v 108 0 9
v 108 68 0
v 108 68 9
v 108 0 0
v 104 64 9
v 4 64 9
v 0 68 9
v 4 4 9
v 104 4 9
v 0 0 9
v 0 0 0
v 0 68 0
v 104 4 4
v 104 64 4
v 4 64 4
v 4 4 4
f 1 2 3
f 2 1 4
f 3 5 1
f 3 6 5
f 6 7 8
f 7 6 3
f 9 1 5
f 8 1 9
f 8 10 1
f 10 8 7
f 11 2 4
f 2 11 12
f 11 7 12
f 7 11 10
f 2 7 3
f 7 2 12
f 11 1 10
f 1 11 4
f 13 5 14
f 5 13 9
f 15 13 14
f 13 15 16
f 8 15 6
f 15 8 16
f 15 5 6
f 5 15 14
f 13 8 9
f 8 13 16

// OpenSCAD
// Size of one pentomino unit square (in mm)
length=10;

// Number of rows
tray_rows=6;

// Number of columns
tray_cols=10;

// Thickness of walls and floor (in mm)
wall=4;


module tray() {
	difference() {
		cube([tray_cols*length + 2*wall, tray_rows*length + 2*wall, length/2+wall]);
		translate([wall, wall, wall])
			cube([tray_cols*length, tray_rows*length, length/2+1]);
	}
}

tray();
